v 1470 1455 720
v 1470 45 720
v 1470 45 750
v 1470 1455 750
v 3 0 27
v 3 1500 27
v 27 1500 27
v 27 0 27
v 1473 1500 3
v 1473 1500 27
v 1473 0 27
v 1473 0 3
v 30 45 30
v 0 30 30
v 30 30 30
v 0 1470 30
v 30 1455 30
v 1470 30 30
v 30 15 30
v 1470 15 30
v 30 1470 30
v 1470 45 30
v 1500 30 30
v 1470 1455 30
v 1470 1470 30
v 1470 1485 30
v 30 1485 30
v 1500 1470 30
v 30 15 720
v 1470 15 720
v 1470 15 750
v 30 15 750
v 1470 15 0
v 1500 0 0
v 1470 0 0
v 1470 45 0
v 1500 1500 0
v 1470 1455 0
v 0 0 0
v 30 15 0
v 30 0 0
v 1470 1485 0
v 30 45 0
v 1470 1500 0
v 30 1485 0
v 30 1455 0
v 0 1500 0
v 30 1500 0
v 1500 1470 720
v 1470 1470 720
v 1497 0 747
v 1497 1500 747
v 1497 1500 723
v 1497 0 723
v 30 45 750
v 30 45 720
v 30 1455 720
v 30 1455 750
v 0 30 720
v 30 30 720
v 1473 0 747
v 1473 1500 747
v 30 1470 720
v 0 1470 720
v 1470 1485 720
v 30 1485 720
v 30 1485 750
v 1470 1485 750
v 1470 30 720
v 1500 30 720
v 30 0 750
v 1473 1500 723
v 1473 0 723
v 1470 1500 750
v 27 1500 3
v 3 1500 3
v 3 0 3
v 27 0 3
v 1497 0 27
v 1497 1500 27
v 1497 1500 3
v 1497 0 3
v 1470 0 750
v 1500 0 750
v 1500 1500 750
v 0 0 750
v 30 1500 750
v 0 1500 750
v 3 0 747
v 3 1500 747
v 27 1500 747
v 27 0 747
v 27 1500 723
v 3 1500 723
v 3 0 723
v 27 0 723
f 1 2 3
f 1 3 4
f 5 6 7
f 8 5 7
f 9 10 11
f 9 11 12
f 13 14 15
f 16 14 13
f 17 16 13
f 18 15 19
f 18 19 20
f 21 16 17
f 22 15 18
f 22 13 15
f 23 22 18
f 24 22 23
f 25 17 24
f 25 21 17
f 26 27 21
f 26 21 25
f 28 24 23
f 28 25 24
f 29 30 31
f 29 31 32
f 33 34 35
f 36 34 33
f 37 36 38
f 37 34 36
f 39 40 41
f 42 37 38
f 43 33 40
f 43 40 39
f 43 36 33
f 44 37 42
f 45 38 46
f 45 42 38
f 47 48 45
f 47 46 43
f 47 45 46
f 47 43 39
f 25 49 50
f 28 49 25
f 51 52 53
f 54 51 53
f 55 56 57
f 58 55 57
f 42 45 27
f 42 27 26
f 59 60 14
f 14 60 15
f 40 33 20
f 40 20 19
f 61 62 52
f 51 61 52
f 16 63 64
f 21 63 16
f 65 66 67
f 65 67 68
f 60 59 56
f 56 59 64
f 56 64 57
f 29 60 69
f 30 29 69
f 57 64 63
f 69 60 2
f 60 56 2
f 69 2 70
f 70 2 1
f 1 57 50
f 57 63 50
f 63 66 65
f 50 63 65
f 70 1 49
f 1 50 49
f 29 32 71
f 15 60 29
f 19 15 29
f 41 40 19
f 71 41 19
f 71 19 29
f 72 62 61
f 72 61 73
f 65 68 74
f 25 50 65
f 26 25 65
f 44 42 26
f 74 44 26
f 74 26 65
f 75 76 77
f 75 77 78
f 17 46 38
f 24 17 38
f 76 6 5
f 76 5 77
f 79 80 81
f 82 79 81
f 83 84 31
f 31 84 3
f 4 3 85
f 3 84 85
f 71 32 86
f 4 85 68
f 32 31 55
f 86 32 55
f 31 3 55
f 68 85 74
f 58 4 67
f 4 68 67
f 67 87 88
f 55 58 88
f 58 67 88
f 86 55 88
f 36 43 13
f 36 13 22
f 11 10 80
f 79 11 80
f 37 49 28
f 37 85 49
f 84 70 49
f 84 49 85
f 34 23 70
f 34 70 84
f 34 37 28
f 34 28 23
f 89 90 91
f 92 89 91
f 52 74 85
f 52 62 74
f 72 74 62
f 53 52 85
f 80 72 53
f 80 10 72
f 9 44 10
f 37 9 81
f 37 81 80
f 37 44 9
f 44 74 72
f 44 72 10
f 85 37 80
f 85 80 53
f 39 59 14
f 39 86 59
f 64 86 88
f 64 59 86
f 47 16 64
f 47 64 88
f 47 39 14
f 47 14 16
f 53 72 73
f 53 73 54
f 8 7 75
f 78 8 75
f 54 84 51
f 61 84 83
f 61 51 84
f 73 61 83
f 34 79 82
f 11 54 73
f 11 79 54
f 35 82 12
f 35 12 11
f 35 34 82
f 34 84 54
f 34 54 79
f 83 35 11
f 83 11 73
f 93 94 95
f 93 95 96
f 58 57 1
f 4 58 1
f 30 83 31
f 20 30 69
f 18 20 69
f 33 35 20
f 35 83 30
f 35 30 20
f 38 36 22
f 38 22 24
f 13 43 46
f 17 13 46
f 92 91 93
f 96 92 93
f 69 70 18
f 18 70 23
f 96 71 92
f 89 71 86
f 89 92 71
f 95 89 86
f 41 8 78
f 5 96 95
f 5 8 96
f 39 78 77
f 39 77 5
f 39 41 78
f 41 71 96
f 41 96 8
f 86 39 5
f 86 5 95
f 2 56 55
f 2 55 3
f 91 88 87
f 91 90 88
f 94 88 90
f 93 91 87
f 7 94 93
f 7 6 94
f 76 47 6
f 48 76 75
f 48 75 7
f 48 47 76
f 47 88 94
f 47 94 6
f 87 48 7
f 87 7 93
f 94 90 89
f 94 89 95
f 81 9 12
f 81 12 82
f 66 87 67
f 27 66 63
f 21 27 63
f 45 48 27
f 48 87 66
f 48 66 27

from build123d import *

# Parameters (mm, degrees)
SKETCH_1_W          = 1440
SKETCH_1_H          = 1410
EXTRUDE_1_DEPTH     = 750
SKETCH_2_W          = 690
SKETCH_2_H          = 1440
CUT_EXTRUDE_1_DEPTH = 2251
SKETCH_3_W          = 1440
SKETCH_3_H          = 690
CUT_EXTRUDE_2_DEPTH = 2241.027901612
SKETCH_4_W          = 24
SKETCH_4_H          = 24
CUT_EXTRUDE_3_DEPTH = 2251


with BuildPart() as part:
    # Эскиз1 → Бобышка-Вытянуть1 (new body)
    with BuildSketch(Plane.XY):
        Polygon((30, 1500), (30, 1485), (1470, 1485), (1470, 1500), (1500, 1500), (1500, 0), (1470, 0), (1470, 15), (30, 15), (30, 0), (0, 0), (0, 1500), align=None)
        with Locations((750, 750)):
            Rectangle(SKETCH_1_W, SKETCH_1_H, mode=Mode.SUBTRACT)
    extrude(amount=EXTRUDE_1_DEPTH)

    # Эскиз2 → Вырез-Вытянуть1 (cut, through all)
    with BuildSketch(Plane(origin=(1500, 0, 0), x_dir=(0, 0, -1), z_dir=(1, 0, 0))):
        with Locations((-375, 750)):
            Rectangle(SKETCH_2_W, SKETCH_2_H)
    extrude(amount=-CUT_EXTRUDE_1_DEPTH, mode=Mode.SUBTRACT)

    # Эскиз3 → Вырез-Вытянуть2 (cut, through all)
    with BuildSketch(Plane(origin=(0, 1485, 0), x_dir=(1, 0, 0), z_dir=(0, 1, 0))):
        with Locations((750, -375)):
            Rectangle(SKETCH_3_W, SKETCH_3_H)
    extrude(amount=-CUT_EXTRUDE_2_DEPTH, mode=Mode.SUBTRACT)

    # Эскиз4 → Вырез-Вытянуть3 (cut, through all)
    with BuildSketch(Plane(origin=(0, 1500, 0), x_dir=(1, 0, 0), z_dir=(0, 1, 0))):
        with Locations((15, -15)):
            Rectangle(SKETCH_4_W, SKETCH_4_H)
        with Locations((1485, -735)):
            Rectangle(SKETCH_4_W, SKETCH_4_H)
        with Locations((1485, -15)):
            Rectangle(SKETCH_4_W, SKETCH_4_H)
        with Locations((15, -735)):
            Rectangle(SKETCH_4_W, SKETCH_4_H)
    extrude(amount=-CUT_EXTRUDE_3_DEPTH, mode=Mode.SUBTRACT)


solid = part.part
